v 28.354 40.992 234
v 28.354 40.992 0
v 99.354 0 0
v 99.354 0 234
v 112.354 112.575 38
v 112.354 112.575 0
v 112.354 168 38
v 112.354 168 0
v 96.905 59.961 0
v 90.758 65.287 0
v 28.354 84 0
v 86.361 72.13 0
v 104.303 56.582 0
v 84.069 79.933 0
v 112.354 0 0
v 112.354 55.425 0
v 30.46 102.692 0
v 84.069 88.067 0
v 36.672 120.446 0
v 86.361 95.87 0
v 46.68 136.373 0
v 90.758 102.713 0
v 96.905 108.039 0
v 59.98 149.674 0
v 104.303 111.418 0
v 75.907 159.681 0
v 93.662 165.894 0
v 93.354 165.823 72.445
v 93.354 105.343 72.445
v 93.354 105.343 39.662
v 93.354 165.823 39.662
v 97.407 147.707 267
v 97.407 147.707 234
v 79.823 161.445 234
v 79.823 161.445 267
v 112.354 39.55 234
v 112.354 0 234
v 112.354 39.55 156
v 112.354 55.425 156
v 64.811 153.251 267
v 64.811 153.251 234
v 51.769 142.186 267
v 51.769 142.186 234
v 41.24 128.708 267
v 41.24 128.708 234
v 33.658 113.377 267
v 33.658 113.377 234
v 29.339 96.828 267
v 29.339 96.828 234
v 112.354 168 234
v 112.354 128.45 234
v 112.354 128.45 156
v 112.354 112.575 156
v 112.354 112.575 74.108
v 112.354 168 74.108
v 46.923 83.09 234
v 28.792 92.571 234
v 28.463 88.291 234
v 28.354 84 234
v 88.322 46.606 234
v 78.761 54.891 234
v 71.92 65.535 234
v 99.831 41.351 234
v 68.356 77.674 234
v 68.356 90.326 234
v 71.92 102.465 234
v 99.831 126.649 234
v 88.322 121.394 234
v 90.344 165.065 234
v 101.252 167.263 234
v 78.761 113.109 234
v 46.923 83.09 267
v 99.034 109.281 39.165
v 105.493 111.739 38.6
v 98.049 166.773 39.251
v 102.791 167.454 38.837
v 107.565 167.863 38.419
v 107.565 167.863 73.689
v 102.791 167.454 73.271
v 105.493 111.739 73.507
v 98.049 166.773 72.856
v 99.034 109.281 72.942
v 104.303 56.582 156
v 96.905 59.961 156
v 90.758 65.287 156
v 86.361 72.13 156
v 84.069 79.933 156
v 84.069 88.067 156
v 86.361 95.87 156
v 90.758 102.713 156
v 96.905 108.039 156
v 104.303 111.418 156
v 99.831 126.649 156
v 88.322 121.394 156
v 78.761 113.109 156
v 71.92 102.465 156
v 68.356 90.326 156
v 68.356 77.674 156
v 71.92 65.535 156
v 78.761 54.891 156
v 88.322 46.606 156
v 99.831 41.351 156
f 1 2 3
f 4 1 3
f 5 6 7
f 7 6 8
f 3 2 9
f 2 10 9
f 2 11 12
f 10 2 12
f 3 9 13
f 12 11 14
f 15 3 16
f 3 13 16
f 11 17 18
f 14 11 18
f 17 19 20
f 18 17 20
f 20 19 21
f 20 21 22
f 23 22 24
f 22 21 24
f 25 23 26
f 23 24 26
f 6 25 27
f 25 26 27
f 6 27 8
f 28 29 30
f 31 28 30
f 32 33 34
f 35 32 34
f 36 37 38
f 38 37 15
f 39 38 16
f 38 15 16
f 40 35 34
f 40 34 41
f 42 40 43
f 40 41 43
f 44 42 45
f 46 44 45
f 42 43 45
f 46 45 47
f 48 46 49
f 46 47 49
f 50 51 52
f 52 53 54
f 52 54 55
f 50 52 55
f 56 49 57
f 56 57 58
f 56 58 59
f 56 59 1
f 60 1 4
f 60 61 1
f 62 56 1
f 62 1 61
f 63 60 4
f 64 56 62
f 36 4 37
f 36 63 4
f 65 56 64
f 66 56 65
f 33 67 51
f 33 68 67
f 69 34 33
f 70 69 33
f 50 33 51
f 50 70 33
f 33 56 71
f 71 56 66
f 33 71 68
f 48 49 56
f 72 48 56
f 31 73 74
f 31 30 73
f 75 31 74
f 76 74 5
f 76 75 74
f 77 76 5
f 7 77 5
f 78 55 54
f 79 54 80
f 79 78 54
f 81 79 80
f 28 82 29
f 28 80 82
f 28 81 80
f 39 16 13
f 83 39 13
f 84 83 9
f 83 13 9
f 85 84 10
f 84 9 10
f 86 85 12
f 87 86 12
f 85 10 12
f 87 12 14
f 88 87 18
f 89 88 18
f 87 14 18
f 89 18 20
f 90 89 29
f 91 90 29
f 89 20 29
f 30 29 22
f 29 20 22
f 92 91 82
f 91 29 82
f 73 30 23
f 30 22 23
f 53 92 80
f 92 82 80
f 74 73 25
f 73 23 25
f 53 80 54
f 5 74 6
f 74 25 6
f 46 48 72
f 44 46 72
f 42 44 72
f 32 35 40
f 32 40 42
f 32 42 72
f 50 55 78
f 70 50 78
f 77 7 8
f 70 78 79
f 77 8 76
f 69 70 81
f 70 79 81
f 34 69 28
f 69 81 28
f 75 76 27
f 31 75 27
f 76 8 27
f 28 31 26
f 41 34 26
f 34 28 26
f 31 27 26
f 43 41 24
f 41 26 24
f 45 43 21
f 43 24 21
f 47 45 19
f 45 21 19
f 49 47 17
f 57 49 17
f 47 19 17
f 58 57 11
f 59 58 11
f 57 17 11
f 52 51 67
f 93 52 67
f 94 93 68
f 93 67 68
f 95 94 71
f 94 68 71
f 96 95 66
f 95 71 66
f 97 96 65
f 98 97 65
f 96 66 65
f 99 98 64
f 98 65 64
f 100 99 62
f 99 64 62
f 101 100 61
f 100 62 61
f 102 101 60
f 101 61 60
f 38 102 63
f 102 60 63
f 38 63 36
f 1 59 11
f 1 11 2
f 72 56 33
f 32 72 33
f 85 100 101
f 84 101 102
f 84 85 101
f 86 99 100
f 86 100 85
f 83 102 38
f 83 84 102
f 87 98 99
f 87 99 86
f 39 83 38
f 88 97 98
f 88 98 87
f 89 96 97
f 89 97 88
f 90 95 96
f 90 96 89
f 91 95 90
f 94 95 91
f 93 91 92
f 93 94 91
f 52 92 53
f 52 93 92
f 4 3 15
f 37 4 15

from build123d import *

# Parameters (mm, degrees)
BOSS_EXTRUDE2_DEPTH     = 234
SKETCH3_R               = 44.45
CUT_EXTRUDE1_DEPTH      = 78
BOSS_EXTRUDE3_DEPTH     = 33
CUT_EXTRUDE3_REACH      = 336.868
CUT_EXTRUDE3_END_RADIUS = 28.575


with BuildPart() as part:
    # Sketch1 → Boss-Extrude2 (new body)
    with BuildSketch(Plane.XY):
        with BuildLine():
            Line((28.35361426, 84), (28.35361426, 40.991869112))
            Line((28.35361426, 40.991869112), (99.35361426, 0))
            Line((99.35361426, 0), (112.35361426, 0))
            Line((112.35361426, 0), (112.35361426, 55.425))
            ThreePointArc((112.35361426, 55.425), (83.77861426, 84), (112.35361426, 112.575))
            Line((112.35361426, 112.575), (112.35361426, 168))
            ThreePointArc((112.35361426, 168), (52.95664464, 143.39696962), (28.35361426, 84))
        make_face()
    extrude(amount=BOSS_EXTRUDE2_DEPTH)

    # Sketch3 → Cut-Extrude1 (cut)
    with BuildSketch(Plane.XY.offset(234)):
        with Locations((112.35361426, 84)):
            Circle(SKETCH3_R)
    extrude(amount=-CUT_EXTRUDE1_DEPTH, mode=Mode.SUBTRACT)

    # Sketch4 → Boss-Extrude3 (add)
    with BuildSketch(Plane.XY.offset(234)):
        with BuildLine():
            Line((46.922945338, 83.090294344), (97.407186315, 147.707176139))
            Line((97.407186315, 147.707176139), (79.823205858, 161.445287327))
            ThreePointArc((79.823205858, 161.445287327), (46.160710957, 135.715563927), (29.338964881, 96.828405531))
            Line((29.338964881, 96.828405531), (46.922945338, 83.090294344))
        make_face()
    extrude(amount=BOSS_EXTRUDE3_DEPTH)

    # Cut-Extrude3: up to this cylinder (the profile starts outside it)
    cut_extrude3_end = Plane(origin=(112.35361426, 84, 56.053764), z_dir=(0, 0, -1)) * Cylinder(CUT_EXTRUDE3_END_RADIUS, 731.886, mode=Mode.PRIVATE)
    # Sketch5 → Cut-Extrude3 (cut, up to the surface)
    with BuildSketch(Plane(origin=(0, 168, 0), x_dir=(1, 0, 0), z_dir=(0, 1, 0)), mode=Mode.PRIVATE) as cut_extrude3_sk1:
        Polygon((112.35361426, -38), (112.35361426, -74.107528994), (93.35361426, -72.445244387), (93.35361426, -39.662284607), align=None)
    cut_extrude3_tool1 = extrude(cut_extrude3_sk1.sketch, amount=-CUT_EXTRUDE3_REACH, mode=Mode.PRIVATE) - cut_extrude3_end
    add(cut_extrude3_tool1.solids().sort_by_distance((103.006434, 168, 56.053764))[0], mode=Mode.SUBTRACT)


solid = part.part
